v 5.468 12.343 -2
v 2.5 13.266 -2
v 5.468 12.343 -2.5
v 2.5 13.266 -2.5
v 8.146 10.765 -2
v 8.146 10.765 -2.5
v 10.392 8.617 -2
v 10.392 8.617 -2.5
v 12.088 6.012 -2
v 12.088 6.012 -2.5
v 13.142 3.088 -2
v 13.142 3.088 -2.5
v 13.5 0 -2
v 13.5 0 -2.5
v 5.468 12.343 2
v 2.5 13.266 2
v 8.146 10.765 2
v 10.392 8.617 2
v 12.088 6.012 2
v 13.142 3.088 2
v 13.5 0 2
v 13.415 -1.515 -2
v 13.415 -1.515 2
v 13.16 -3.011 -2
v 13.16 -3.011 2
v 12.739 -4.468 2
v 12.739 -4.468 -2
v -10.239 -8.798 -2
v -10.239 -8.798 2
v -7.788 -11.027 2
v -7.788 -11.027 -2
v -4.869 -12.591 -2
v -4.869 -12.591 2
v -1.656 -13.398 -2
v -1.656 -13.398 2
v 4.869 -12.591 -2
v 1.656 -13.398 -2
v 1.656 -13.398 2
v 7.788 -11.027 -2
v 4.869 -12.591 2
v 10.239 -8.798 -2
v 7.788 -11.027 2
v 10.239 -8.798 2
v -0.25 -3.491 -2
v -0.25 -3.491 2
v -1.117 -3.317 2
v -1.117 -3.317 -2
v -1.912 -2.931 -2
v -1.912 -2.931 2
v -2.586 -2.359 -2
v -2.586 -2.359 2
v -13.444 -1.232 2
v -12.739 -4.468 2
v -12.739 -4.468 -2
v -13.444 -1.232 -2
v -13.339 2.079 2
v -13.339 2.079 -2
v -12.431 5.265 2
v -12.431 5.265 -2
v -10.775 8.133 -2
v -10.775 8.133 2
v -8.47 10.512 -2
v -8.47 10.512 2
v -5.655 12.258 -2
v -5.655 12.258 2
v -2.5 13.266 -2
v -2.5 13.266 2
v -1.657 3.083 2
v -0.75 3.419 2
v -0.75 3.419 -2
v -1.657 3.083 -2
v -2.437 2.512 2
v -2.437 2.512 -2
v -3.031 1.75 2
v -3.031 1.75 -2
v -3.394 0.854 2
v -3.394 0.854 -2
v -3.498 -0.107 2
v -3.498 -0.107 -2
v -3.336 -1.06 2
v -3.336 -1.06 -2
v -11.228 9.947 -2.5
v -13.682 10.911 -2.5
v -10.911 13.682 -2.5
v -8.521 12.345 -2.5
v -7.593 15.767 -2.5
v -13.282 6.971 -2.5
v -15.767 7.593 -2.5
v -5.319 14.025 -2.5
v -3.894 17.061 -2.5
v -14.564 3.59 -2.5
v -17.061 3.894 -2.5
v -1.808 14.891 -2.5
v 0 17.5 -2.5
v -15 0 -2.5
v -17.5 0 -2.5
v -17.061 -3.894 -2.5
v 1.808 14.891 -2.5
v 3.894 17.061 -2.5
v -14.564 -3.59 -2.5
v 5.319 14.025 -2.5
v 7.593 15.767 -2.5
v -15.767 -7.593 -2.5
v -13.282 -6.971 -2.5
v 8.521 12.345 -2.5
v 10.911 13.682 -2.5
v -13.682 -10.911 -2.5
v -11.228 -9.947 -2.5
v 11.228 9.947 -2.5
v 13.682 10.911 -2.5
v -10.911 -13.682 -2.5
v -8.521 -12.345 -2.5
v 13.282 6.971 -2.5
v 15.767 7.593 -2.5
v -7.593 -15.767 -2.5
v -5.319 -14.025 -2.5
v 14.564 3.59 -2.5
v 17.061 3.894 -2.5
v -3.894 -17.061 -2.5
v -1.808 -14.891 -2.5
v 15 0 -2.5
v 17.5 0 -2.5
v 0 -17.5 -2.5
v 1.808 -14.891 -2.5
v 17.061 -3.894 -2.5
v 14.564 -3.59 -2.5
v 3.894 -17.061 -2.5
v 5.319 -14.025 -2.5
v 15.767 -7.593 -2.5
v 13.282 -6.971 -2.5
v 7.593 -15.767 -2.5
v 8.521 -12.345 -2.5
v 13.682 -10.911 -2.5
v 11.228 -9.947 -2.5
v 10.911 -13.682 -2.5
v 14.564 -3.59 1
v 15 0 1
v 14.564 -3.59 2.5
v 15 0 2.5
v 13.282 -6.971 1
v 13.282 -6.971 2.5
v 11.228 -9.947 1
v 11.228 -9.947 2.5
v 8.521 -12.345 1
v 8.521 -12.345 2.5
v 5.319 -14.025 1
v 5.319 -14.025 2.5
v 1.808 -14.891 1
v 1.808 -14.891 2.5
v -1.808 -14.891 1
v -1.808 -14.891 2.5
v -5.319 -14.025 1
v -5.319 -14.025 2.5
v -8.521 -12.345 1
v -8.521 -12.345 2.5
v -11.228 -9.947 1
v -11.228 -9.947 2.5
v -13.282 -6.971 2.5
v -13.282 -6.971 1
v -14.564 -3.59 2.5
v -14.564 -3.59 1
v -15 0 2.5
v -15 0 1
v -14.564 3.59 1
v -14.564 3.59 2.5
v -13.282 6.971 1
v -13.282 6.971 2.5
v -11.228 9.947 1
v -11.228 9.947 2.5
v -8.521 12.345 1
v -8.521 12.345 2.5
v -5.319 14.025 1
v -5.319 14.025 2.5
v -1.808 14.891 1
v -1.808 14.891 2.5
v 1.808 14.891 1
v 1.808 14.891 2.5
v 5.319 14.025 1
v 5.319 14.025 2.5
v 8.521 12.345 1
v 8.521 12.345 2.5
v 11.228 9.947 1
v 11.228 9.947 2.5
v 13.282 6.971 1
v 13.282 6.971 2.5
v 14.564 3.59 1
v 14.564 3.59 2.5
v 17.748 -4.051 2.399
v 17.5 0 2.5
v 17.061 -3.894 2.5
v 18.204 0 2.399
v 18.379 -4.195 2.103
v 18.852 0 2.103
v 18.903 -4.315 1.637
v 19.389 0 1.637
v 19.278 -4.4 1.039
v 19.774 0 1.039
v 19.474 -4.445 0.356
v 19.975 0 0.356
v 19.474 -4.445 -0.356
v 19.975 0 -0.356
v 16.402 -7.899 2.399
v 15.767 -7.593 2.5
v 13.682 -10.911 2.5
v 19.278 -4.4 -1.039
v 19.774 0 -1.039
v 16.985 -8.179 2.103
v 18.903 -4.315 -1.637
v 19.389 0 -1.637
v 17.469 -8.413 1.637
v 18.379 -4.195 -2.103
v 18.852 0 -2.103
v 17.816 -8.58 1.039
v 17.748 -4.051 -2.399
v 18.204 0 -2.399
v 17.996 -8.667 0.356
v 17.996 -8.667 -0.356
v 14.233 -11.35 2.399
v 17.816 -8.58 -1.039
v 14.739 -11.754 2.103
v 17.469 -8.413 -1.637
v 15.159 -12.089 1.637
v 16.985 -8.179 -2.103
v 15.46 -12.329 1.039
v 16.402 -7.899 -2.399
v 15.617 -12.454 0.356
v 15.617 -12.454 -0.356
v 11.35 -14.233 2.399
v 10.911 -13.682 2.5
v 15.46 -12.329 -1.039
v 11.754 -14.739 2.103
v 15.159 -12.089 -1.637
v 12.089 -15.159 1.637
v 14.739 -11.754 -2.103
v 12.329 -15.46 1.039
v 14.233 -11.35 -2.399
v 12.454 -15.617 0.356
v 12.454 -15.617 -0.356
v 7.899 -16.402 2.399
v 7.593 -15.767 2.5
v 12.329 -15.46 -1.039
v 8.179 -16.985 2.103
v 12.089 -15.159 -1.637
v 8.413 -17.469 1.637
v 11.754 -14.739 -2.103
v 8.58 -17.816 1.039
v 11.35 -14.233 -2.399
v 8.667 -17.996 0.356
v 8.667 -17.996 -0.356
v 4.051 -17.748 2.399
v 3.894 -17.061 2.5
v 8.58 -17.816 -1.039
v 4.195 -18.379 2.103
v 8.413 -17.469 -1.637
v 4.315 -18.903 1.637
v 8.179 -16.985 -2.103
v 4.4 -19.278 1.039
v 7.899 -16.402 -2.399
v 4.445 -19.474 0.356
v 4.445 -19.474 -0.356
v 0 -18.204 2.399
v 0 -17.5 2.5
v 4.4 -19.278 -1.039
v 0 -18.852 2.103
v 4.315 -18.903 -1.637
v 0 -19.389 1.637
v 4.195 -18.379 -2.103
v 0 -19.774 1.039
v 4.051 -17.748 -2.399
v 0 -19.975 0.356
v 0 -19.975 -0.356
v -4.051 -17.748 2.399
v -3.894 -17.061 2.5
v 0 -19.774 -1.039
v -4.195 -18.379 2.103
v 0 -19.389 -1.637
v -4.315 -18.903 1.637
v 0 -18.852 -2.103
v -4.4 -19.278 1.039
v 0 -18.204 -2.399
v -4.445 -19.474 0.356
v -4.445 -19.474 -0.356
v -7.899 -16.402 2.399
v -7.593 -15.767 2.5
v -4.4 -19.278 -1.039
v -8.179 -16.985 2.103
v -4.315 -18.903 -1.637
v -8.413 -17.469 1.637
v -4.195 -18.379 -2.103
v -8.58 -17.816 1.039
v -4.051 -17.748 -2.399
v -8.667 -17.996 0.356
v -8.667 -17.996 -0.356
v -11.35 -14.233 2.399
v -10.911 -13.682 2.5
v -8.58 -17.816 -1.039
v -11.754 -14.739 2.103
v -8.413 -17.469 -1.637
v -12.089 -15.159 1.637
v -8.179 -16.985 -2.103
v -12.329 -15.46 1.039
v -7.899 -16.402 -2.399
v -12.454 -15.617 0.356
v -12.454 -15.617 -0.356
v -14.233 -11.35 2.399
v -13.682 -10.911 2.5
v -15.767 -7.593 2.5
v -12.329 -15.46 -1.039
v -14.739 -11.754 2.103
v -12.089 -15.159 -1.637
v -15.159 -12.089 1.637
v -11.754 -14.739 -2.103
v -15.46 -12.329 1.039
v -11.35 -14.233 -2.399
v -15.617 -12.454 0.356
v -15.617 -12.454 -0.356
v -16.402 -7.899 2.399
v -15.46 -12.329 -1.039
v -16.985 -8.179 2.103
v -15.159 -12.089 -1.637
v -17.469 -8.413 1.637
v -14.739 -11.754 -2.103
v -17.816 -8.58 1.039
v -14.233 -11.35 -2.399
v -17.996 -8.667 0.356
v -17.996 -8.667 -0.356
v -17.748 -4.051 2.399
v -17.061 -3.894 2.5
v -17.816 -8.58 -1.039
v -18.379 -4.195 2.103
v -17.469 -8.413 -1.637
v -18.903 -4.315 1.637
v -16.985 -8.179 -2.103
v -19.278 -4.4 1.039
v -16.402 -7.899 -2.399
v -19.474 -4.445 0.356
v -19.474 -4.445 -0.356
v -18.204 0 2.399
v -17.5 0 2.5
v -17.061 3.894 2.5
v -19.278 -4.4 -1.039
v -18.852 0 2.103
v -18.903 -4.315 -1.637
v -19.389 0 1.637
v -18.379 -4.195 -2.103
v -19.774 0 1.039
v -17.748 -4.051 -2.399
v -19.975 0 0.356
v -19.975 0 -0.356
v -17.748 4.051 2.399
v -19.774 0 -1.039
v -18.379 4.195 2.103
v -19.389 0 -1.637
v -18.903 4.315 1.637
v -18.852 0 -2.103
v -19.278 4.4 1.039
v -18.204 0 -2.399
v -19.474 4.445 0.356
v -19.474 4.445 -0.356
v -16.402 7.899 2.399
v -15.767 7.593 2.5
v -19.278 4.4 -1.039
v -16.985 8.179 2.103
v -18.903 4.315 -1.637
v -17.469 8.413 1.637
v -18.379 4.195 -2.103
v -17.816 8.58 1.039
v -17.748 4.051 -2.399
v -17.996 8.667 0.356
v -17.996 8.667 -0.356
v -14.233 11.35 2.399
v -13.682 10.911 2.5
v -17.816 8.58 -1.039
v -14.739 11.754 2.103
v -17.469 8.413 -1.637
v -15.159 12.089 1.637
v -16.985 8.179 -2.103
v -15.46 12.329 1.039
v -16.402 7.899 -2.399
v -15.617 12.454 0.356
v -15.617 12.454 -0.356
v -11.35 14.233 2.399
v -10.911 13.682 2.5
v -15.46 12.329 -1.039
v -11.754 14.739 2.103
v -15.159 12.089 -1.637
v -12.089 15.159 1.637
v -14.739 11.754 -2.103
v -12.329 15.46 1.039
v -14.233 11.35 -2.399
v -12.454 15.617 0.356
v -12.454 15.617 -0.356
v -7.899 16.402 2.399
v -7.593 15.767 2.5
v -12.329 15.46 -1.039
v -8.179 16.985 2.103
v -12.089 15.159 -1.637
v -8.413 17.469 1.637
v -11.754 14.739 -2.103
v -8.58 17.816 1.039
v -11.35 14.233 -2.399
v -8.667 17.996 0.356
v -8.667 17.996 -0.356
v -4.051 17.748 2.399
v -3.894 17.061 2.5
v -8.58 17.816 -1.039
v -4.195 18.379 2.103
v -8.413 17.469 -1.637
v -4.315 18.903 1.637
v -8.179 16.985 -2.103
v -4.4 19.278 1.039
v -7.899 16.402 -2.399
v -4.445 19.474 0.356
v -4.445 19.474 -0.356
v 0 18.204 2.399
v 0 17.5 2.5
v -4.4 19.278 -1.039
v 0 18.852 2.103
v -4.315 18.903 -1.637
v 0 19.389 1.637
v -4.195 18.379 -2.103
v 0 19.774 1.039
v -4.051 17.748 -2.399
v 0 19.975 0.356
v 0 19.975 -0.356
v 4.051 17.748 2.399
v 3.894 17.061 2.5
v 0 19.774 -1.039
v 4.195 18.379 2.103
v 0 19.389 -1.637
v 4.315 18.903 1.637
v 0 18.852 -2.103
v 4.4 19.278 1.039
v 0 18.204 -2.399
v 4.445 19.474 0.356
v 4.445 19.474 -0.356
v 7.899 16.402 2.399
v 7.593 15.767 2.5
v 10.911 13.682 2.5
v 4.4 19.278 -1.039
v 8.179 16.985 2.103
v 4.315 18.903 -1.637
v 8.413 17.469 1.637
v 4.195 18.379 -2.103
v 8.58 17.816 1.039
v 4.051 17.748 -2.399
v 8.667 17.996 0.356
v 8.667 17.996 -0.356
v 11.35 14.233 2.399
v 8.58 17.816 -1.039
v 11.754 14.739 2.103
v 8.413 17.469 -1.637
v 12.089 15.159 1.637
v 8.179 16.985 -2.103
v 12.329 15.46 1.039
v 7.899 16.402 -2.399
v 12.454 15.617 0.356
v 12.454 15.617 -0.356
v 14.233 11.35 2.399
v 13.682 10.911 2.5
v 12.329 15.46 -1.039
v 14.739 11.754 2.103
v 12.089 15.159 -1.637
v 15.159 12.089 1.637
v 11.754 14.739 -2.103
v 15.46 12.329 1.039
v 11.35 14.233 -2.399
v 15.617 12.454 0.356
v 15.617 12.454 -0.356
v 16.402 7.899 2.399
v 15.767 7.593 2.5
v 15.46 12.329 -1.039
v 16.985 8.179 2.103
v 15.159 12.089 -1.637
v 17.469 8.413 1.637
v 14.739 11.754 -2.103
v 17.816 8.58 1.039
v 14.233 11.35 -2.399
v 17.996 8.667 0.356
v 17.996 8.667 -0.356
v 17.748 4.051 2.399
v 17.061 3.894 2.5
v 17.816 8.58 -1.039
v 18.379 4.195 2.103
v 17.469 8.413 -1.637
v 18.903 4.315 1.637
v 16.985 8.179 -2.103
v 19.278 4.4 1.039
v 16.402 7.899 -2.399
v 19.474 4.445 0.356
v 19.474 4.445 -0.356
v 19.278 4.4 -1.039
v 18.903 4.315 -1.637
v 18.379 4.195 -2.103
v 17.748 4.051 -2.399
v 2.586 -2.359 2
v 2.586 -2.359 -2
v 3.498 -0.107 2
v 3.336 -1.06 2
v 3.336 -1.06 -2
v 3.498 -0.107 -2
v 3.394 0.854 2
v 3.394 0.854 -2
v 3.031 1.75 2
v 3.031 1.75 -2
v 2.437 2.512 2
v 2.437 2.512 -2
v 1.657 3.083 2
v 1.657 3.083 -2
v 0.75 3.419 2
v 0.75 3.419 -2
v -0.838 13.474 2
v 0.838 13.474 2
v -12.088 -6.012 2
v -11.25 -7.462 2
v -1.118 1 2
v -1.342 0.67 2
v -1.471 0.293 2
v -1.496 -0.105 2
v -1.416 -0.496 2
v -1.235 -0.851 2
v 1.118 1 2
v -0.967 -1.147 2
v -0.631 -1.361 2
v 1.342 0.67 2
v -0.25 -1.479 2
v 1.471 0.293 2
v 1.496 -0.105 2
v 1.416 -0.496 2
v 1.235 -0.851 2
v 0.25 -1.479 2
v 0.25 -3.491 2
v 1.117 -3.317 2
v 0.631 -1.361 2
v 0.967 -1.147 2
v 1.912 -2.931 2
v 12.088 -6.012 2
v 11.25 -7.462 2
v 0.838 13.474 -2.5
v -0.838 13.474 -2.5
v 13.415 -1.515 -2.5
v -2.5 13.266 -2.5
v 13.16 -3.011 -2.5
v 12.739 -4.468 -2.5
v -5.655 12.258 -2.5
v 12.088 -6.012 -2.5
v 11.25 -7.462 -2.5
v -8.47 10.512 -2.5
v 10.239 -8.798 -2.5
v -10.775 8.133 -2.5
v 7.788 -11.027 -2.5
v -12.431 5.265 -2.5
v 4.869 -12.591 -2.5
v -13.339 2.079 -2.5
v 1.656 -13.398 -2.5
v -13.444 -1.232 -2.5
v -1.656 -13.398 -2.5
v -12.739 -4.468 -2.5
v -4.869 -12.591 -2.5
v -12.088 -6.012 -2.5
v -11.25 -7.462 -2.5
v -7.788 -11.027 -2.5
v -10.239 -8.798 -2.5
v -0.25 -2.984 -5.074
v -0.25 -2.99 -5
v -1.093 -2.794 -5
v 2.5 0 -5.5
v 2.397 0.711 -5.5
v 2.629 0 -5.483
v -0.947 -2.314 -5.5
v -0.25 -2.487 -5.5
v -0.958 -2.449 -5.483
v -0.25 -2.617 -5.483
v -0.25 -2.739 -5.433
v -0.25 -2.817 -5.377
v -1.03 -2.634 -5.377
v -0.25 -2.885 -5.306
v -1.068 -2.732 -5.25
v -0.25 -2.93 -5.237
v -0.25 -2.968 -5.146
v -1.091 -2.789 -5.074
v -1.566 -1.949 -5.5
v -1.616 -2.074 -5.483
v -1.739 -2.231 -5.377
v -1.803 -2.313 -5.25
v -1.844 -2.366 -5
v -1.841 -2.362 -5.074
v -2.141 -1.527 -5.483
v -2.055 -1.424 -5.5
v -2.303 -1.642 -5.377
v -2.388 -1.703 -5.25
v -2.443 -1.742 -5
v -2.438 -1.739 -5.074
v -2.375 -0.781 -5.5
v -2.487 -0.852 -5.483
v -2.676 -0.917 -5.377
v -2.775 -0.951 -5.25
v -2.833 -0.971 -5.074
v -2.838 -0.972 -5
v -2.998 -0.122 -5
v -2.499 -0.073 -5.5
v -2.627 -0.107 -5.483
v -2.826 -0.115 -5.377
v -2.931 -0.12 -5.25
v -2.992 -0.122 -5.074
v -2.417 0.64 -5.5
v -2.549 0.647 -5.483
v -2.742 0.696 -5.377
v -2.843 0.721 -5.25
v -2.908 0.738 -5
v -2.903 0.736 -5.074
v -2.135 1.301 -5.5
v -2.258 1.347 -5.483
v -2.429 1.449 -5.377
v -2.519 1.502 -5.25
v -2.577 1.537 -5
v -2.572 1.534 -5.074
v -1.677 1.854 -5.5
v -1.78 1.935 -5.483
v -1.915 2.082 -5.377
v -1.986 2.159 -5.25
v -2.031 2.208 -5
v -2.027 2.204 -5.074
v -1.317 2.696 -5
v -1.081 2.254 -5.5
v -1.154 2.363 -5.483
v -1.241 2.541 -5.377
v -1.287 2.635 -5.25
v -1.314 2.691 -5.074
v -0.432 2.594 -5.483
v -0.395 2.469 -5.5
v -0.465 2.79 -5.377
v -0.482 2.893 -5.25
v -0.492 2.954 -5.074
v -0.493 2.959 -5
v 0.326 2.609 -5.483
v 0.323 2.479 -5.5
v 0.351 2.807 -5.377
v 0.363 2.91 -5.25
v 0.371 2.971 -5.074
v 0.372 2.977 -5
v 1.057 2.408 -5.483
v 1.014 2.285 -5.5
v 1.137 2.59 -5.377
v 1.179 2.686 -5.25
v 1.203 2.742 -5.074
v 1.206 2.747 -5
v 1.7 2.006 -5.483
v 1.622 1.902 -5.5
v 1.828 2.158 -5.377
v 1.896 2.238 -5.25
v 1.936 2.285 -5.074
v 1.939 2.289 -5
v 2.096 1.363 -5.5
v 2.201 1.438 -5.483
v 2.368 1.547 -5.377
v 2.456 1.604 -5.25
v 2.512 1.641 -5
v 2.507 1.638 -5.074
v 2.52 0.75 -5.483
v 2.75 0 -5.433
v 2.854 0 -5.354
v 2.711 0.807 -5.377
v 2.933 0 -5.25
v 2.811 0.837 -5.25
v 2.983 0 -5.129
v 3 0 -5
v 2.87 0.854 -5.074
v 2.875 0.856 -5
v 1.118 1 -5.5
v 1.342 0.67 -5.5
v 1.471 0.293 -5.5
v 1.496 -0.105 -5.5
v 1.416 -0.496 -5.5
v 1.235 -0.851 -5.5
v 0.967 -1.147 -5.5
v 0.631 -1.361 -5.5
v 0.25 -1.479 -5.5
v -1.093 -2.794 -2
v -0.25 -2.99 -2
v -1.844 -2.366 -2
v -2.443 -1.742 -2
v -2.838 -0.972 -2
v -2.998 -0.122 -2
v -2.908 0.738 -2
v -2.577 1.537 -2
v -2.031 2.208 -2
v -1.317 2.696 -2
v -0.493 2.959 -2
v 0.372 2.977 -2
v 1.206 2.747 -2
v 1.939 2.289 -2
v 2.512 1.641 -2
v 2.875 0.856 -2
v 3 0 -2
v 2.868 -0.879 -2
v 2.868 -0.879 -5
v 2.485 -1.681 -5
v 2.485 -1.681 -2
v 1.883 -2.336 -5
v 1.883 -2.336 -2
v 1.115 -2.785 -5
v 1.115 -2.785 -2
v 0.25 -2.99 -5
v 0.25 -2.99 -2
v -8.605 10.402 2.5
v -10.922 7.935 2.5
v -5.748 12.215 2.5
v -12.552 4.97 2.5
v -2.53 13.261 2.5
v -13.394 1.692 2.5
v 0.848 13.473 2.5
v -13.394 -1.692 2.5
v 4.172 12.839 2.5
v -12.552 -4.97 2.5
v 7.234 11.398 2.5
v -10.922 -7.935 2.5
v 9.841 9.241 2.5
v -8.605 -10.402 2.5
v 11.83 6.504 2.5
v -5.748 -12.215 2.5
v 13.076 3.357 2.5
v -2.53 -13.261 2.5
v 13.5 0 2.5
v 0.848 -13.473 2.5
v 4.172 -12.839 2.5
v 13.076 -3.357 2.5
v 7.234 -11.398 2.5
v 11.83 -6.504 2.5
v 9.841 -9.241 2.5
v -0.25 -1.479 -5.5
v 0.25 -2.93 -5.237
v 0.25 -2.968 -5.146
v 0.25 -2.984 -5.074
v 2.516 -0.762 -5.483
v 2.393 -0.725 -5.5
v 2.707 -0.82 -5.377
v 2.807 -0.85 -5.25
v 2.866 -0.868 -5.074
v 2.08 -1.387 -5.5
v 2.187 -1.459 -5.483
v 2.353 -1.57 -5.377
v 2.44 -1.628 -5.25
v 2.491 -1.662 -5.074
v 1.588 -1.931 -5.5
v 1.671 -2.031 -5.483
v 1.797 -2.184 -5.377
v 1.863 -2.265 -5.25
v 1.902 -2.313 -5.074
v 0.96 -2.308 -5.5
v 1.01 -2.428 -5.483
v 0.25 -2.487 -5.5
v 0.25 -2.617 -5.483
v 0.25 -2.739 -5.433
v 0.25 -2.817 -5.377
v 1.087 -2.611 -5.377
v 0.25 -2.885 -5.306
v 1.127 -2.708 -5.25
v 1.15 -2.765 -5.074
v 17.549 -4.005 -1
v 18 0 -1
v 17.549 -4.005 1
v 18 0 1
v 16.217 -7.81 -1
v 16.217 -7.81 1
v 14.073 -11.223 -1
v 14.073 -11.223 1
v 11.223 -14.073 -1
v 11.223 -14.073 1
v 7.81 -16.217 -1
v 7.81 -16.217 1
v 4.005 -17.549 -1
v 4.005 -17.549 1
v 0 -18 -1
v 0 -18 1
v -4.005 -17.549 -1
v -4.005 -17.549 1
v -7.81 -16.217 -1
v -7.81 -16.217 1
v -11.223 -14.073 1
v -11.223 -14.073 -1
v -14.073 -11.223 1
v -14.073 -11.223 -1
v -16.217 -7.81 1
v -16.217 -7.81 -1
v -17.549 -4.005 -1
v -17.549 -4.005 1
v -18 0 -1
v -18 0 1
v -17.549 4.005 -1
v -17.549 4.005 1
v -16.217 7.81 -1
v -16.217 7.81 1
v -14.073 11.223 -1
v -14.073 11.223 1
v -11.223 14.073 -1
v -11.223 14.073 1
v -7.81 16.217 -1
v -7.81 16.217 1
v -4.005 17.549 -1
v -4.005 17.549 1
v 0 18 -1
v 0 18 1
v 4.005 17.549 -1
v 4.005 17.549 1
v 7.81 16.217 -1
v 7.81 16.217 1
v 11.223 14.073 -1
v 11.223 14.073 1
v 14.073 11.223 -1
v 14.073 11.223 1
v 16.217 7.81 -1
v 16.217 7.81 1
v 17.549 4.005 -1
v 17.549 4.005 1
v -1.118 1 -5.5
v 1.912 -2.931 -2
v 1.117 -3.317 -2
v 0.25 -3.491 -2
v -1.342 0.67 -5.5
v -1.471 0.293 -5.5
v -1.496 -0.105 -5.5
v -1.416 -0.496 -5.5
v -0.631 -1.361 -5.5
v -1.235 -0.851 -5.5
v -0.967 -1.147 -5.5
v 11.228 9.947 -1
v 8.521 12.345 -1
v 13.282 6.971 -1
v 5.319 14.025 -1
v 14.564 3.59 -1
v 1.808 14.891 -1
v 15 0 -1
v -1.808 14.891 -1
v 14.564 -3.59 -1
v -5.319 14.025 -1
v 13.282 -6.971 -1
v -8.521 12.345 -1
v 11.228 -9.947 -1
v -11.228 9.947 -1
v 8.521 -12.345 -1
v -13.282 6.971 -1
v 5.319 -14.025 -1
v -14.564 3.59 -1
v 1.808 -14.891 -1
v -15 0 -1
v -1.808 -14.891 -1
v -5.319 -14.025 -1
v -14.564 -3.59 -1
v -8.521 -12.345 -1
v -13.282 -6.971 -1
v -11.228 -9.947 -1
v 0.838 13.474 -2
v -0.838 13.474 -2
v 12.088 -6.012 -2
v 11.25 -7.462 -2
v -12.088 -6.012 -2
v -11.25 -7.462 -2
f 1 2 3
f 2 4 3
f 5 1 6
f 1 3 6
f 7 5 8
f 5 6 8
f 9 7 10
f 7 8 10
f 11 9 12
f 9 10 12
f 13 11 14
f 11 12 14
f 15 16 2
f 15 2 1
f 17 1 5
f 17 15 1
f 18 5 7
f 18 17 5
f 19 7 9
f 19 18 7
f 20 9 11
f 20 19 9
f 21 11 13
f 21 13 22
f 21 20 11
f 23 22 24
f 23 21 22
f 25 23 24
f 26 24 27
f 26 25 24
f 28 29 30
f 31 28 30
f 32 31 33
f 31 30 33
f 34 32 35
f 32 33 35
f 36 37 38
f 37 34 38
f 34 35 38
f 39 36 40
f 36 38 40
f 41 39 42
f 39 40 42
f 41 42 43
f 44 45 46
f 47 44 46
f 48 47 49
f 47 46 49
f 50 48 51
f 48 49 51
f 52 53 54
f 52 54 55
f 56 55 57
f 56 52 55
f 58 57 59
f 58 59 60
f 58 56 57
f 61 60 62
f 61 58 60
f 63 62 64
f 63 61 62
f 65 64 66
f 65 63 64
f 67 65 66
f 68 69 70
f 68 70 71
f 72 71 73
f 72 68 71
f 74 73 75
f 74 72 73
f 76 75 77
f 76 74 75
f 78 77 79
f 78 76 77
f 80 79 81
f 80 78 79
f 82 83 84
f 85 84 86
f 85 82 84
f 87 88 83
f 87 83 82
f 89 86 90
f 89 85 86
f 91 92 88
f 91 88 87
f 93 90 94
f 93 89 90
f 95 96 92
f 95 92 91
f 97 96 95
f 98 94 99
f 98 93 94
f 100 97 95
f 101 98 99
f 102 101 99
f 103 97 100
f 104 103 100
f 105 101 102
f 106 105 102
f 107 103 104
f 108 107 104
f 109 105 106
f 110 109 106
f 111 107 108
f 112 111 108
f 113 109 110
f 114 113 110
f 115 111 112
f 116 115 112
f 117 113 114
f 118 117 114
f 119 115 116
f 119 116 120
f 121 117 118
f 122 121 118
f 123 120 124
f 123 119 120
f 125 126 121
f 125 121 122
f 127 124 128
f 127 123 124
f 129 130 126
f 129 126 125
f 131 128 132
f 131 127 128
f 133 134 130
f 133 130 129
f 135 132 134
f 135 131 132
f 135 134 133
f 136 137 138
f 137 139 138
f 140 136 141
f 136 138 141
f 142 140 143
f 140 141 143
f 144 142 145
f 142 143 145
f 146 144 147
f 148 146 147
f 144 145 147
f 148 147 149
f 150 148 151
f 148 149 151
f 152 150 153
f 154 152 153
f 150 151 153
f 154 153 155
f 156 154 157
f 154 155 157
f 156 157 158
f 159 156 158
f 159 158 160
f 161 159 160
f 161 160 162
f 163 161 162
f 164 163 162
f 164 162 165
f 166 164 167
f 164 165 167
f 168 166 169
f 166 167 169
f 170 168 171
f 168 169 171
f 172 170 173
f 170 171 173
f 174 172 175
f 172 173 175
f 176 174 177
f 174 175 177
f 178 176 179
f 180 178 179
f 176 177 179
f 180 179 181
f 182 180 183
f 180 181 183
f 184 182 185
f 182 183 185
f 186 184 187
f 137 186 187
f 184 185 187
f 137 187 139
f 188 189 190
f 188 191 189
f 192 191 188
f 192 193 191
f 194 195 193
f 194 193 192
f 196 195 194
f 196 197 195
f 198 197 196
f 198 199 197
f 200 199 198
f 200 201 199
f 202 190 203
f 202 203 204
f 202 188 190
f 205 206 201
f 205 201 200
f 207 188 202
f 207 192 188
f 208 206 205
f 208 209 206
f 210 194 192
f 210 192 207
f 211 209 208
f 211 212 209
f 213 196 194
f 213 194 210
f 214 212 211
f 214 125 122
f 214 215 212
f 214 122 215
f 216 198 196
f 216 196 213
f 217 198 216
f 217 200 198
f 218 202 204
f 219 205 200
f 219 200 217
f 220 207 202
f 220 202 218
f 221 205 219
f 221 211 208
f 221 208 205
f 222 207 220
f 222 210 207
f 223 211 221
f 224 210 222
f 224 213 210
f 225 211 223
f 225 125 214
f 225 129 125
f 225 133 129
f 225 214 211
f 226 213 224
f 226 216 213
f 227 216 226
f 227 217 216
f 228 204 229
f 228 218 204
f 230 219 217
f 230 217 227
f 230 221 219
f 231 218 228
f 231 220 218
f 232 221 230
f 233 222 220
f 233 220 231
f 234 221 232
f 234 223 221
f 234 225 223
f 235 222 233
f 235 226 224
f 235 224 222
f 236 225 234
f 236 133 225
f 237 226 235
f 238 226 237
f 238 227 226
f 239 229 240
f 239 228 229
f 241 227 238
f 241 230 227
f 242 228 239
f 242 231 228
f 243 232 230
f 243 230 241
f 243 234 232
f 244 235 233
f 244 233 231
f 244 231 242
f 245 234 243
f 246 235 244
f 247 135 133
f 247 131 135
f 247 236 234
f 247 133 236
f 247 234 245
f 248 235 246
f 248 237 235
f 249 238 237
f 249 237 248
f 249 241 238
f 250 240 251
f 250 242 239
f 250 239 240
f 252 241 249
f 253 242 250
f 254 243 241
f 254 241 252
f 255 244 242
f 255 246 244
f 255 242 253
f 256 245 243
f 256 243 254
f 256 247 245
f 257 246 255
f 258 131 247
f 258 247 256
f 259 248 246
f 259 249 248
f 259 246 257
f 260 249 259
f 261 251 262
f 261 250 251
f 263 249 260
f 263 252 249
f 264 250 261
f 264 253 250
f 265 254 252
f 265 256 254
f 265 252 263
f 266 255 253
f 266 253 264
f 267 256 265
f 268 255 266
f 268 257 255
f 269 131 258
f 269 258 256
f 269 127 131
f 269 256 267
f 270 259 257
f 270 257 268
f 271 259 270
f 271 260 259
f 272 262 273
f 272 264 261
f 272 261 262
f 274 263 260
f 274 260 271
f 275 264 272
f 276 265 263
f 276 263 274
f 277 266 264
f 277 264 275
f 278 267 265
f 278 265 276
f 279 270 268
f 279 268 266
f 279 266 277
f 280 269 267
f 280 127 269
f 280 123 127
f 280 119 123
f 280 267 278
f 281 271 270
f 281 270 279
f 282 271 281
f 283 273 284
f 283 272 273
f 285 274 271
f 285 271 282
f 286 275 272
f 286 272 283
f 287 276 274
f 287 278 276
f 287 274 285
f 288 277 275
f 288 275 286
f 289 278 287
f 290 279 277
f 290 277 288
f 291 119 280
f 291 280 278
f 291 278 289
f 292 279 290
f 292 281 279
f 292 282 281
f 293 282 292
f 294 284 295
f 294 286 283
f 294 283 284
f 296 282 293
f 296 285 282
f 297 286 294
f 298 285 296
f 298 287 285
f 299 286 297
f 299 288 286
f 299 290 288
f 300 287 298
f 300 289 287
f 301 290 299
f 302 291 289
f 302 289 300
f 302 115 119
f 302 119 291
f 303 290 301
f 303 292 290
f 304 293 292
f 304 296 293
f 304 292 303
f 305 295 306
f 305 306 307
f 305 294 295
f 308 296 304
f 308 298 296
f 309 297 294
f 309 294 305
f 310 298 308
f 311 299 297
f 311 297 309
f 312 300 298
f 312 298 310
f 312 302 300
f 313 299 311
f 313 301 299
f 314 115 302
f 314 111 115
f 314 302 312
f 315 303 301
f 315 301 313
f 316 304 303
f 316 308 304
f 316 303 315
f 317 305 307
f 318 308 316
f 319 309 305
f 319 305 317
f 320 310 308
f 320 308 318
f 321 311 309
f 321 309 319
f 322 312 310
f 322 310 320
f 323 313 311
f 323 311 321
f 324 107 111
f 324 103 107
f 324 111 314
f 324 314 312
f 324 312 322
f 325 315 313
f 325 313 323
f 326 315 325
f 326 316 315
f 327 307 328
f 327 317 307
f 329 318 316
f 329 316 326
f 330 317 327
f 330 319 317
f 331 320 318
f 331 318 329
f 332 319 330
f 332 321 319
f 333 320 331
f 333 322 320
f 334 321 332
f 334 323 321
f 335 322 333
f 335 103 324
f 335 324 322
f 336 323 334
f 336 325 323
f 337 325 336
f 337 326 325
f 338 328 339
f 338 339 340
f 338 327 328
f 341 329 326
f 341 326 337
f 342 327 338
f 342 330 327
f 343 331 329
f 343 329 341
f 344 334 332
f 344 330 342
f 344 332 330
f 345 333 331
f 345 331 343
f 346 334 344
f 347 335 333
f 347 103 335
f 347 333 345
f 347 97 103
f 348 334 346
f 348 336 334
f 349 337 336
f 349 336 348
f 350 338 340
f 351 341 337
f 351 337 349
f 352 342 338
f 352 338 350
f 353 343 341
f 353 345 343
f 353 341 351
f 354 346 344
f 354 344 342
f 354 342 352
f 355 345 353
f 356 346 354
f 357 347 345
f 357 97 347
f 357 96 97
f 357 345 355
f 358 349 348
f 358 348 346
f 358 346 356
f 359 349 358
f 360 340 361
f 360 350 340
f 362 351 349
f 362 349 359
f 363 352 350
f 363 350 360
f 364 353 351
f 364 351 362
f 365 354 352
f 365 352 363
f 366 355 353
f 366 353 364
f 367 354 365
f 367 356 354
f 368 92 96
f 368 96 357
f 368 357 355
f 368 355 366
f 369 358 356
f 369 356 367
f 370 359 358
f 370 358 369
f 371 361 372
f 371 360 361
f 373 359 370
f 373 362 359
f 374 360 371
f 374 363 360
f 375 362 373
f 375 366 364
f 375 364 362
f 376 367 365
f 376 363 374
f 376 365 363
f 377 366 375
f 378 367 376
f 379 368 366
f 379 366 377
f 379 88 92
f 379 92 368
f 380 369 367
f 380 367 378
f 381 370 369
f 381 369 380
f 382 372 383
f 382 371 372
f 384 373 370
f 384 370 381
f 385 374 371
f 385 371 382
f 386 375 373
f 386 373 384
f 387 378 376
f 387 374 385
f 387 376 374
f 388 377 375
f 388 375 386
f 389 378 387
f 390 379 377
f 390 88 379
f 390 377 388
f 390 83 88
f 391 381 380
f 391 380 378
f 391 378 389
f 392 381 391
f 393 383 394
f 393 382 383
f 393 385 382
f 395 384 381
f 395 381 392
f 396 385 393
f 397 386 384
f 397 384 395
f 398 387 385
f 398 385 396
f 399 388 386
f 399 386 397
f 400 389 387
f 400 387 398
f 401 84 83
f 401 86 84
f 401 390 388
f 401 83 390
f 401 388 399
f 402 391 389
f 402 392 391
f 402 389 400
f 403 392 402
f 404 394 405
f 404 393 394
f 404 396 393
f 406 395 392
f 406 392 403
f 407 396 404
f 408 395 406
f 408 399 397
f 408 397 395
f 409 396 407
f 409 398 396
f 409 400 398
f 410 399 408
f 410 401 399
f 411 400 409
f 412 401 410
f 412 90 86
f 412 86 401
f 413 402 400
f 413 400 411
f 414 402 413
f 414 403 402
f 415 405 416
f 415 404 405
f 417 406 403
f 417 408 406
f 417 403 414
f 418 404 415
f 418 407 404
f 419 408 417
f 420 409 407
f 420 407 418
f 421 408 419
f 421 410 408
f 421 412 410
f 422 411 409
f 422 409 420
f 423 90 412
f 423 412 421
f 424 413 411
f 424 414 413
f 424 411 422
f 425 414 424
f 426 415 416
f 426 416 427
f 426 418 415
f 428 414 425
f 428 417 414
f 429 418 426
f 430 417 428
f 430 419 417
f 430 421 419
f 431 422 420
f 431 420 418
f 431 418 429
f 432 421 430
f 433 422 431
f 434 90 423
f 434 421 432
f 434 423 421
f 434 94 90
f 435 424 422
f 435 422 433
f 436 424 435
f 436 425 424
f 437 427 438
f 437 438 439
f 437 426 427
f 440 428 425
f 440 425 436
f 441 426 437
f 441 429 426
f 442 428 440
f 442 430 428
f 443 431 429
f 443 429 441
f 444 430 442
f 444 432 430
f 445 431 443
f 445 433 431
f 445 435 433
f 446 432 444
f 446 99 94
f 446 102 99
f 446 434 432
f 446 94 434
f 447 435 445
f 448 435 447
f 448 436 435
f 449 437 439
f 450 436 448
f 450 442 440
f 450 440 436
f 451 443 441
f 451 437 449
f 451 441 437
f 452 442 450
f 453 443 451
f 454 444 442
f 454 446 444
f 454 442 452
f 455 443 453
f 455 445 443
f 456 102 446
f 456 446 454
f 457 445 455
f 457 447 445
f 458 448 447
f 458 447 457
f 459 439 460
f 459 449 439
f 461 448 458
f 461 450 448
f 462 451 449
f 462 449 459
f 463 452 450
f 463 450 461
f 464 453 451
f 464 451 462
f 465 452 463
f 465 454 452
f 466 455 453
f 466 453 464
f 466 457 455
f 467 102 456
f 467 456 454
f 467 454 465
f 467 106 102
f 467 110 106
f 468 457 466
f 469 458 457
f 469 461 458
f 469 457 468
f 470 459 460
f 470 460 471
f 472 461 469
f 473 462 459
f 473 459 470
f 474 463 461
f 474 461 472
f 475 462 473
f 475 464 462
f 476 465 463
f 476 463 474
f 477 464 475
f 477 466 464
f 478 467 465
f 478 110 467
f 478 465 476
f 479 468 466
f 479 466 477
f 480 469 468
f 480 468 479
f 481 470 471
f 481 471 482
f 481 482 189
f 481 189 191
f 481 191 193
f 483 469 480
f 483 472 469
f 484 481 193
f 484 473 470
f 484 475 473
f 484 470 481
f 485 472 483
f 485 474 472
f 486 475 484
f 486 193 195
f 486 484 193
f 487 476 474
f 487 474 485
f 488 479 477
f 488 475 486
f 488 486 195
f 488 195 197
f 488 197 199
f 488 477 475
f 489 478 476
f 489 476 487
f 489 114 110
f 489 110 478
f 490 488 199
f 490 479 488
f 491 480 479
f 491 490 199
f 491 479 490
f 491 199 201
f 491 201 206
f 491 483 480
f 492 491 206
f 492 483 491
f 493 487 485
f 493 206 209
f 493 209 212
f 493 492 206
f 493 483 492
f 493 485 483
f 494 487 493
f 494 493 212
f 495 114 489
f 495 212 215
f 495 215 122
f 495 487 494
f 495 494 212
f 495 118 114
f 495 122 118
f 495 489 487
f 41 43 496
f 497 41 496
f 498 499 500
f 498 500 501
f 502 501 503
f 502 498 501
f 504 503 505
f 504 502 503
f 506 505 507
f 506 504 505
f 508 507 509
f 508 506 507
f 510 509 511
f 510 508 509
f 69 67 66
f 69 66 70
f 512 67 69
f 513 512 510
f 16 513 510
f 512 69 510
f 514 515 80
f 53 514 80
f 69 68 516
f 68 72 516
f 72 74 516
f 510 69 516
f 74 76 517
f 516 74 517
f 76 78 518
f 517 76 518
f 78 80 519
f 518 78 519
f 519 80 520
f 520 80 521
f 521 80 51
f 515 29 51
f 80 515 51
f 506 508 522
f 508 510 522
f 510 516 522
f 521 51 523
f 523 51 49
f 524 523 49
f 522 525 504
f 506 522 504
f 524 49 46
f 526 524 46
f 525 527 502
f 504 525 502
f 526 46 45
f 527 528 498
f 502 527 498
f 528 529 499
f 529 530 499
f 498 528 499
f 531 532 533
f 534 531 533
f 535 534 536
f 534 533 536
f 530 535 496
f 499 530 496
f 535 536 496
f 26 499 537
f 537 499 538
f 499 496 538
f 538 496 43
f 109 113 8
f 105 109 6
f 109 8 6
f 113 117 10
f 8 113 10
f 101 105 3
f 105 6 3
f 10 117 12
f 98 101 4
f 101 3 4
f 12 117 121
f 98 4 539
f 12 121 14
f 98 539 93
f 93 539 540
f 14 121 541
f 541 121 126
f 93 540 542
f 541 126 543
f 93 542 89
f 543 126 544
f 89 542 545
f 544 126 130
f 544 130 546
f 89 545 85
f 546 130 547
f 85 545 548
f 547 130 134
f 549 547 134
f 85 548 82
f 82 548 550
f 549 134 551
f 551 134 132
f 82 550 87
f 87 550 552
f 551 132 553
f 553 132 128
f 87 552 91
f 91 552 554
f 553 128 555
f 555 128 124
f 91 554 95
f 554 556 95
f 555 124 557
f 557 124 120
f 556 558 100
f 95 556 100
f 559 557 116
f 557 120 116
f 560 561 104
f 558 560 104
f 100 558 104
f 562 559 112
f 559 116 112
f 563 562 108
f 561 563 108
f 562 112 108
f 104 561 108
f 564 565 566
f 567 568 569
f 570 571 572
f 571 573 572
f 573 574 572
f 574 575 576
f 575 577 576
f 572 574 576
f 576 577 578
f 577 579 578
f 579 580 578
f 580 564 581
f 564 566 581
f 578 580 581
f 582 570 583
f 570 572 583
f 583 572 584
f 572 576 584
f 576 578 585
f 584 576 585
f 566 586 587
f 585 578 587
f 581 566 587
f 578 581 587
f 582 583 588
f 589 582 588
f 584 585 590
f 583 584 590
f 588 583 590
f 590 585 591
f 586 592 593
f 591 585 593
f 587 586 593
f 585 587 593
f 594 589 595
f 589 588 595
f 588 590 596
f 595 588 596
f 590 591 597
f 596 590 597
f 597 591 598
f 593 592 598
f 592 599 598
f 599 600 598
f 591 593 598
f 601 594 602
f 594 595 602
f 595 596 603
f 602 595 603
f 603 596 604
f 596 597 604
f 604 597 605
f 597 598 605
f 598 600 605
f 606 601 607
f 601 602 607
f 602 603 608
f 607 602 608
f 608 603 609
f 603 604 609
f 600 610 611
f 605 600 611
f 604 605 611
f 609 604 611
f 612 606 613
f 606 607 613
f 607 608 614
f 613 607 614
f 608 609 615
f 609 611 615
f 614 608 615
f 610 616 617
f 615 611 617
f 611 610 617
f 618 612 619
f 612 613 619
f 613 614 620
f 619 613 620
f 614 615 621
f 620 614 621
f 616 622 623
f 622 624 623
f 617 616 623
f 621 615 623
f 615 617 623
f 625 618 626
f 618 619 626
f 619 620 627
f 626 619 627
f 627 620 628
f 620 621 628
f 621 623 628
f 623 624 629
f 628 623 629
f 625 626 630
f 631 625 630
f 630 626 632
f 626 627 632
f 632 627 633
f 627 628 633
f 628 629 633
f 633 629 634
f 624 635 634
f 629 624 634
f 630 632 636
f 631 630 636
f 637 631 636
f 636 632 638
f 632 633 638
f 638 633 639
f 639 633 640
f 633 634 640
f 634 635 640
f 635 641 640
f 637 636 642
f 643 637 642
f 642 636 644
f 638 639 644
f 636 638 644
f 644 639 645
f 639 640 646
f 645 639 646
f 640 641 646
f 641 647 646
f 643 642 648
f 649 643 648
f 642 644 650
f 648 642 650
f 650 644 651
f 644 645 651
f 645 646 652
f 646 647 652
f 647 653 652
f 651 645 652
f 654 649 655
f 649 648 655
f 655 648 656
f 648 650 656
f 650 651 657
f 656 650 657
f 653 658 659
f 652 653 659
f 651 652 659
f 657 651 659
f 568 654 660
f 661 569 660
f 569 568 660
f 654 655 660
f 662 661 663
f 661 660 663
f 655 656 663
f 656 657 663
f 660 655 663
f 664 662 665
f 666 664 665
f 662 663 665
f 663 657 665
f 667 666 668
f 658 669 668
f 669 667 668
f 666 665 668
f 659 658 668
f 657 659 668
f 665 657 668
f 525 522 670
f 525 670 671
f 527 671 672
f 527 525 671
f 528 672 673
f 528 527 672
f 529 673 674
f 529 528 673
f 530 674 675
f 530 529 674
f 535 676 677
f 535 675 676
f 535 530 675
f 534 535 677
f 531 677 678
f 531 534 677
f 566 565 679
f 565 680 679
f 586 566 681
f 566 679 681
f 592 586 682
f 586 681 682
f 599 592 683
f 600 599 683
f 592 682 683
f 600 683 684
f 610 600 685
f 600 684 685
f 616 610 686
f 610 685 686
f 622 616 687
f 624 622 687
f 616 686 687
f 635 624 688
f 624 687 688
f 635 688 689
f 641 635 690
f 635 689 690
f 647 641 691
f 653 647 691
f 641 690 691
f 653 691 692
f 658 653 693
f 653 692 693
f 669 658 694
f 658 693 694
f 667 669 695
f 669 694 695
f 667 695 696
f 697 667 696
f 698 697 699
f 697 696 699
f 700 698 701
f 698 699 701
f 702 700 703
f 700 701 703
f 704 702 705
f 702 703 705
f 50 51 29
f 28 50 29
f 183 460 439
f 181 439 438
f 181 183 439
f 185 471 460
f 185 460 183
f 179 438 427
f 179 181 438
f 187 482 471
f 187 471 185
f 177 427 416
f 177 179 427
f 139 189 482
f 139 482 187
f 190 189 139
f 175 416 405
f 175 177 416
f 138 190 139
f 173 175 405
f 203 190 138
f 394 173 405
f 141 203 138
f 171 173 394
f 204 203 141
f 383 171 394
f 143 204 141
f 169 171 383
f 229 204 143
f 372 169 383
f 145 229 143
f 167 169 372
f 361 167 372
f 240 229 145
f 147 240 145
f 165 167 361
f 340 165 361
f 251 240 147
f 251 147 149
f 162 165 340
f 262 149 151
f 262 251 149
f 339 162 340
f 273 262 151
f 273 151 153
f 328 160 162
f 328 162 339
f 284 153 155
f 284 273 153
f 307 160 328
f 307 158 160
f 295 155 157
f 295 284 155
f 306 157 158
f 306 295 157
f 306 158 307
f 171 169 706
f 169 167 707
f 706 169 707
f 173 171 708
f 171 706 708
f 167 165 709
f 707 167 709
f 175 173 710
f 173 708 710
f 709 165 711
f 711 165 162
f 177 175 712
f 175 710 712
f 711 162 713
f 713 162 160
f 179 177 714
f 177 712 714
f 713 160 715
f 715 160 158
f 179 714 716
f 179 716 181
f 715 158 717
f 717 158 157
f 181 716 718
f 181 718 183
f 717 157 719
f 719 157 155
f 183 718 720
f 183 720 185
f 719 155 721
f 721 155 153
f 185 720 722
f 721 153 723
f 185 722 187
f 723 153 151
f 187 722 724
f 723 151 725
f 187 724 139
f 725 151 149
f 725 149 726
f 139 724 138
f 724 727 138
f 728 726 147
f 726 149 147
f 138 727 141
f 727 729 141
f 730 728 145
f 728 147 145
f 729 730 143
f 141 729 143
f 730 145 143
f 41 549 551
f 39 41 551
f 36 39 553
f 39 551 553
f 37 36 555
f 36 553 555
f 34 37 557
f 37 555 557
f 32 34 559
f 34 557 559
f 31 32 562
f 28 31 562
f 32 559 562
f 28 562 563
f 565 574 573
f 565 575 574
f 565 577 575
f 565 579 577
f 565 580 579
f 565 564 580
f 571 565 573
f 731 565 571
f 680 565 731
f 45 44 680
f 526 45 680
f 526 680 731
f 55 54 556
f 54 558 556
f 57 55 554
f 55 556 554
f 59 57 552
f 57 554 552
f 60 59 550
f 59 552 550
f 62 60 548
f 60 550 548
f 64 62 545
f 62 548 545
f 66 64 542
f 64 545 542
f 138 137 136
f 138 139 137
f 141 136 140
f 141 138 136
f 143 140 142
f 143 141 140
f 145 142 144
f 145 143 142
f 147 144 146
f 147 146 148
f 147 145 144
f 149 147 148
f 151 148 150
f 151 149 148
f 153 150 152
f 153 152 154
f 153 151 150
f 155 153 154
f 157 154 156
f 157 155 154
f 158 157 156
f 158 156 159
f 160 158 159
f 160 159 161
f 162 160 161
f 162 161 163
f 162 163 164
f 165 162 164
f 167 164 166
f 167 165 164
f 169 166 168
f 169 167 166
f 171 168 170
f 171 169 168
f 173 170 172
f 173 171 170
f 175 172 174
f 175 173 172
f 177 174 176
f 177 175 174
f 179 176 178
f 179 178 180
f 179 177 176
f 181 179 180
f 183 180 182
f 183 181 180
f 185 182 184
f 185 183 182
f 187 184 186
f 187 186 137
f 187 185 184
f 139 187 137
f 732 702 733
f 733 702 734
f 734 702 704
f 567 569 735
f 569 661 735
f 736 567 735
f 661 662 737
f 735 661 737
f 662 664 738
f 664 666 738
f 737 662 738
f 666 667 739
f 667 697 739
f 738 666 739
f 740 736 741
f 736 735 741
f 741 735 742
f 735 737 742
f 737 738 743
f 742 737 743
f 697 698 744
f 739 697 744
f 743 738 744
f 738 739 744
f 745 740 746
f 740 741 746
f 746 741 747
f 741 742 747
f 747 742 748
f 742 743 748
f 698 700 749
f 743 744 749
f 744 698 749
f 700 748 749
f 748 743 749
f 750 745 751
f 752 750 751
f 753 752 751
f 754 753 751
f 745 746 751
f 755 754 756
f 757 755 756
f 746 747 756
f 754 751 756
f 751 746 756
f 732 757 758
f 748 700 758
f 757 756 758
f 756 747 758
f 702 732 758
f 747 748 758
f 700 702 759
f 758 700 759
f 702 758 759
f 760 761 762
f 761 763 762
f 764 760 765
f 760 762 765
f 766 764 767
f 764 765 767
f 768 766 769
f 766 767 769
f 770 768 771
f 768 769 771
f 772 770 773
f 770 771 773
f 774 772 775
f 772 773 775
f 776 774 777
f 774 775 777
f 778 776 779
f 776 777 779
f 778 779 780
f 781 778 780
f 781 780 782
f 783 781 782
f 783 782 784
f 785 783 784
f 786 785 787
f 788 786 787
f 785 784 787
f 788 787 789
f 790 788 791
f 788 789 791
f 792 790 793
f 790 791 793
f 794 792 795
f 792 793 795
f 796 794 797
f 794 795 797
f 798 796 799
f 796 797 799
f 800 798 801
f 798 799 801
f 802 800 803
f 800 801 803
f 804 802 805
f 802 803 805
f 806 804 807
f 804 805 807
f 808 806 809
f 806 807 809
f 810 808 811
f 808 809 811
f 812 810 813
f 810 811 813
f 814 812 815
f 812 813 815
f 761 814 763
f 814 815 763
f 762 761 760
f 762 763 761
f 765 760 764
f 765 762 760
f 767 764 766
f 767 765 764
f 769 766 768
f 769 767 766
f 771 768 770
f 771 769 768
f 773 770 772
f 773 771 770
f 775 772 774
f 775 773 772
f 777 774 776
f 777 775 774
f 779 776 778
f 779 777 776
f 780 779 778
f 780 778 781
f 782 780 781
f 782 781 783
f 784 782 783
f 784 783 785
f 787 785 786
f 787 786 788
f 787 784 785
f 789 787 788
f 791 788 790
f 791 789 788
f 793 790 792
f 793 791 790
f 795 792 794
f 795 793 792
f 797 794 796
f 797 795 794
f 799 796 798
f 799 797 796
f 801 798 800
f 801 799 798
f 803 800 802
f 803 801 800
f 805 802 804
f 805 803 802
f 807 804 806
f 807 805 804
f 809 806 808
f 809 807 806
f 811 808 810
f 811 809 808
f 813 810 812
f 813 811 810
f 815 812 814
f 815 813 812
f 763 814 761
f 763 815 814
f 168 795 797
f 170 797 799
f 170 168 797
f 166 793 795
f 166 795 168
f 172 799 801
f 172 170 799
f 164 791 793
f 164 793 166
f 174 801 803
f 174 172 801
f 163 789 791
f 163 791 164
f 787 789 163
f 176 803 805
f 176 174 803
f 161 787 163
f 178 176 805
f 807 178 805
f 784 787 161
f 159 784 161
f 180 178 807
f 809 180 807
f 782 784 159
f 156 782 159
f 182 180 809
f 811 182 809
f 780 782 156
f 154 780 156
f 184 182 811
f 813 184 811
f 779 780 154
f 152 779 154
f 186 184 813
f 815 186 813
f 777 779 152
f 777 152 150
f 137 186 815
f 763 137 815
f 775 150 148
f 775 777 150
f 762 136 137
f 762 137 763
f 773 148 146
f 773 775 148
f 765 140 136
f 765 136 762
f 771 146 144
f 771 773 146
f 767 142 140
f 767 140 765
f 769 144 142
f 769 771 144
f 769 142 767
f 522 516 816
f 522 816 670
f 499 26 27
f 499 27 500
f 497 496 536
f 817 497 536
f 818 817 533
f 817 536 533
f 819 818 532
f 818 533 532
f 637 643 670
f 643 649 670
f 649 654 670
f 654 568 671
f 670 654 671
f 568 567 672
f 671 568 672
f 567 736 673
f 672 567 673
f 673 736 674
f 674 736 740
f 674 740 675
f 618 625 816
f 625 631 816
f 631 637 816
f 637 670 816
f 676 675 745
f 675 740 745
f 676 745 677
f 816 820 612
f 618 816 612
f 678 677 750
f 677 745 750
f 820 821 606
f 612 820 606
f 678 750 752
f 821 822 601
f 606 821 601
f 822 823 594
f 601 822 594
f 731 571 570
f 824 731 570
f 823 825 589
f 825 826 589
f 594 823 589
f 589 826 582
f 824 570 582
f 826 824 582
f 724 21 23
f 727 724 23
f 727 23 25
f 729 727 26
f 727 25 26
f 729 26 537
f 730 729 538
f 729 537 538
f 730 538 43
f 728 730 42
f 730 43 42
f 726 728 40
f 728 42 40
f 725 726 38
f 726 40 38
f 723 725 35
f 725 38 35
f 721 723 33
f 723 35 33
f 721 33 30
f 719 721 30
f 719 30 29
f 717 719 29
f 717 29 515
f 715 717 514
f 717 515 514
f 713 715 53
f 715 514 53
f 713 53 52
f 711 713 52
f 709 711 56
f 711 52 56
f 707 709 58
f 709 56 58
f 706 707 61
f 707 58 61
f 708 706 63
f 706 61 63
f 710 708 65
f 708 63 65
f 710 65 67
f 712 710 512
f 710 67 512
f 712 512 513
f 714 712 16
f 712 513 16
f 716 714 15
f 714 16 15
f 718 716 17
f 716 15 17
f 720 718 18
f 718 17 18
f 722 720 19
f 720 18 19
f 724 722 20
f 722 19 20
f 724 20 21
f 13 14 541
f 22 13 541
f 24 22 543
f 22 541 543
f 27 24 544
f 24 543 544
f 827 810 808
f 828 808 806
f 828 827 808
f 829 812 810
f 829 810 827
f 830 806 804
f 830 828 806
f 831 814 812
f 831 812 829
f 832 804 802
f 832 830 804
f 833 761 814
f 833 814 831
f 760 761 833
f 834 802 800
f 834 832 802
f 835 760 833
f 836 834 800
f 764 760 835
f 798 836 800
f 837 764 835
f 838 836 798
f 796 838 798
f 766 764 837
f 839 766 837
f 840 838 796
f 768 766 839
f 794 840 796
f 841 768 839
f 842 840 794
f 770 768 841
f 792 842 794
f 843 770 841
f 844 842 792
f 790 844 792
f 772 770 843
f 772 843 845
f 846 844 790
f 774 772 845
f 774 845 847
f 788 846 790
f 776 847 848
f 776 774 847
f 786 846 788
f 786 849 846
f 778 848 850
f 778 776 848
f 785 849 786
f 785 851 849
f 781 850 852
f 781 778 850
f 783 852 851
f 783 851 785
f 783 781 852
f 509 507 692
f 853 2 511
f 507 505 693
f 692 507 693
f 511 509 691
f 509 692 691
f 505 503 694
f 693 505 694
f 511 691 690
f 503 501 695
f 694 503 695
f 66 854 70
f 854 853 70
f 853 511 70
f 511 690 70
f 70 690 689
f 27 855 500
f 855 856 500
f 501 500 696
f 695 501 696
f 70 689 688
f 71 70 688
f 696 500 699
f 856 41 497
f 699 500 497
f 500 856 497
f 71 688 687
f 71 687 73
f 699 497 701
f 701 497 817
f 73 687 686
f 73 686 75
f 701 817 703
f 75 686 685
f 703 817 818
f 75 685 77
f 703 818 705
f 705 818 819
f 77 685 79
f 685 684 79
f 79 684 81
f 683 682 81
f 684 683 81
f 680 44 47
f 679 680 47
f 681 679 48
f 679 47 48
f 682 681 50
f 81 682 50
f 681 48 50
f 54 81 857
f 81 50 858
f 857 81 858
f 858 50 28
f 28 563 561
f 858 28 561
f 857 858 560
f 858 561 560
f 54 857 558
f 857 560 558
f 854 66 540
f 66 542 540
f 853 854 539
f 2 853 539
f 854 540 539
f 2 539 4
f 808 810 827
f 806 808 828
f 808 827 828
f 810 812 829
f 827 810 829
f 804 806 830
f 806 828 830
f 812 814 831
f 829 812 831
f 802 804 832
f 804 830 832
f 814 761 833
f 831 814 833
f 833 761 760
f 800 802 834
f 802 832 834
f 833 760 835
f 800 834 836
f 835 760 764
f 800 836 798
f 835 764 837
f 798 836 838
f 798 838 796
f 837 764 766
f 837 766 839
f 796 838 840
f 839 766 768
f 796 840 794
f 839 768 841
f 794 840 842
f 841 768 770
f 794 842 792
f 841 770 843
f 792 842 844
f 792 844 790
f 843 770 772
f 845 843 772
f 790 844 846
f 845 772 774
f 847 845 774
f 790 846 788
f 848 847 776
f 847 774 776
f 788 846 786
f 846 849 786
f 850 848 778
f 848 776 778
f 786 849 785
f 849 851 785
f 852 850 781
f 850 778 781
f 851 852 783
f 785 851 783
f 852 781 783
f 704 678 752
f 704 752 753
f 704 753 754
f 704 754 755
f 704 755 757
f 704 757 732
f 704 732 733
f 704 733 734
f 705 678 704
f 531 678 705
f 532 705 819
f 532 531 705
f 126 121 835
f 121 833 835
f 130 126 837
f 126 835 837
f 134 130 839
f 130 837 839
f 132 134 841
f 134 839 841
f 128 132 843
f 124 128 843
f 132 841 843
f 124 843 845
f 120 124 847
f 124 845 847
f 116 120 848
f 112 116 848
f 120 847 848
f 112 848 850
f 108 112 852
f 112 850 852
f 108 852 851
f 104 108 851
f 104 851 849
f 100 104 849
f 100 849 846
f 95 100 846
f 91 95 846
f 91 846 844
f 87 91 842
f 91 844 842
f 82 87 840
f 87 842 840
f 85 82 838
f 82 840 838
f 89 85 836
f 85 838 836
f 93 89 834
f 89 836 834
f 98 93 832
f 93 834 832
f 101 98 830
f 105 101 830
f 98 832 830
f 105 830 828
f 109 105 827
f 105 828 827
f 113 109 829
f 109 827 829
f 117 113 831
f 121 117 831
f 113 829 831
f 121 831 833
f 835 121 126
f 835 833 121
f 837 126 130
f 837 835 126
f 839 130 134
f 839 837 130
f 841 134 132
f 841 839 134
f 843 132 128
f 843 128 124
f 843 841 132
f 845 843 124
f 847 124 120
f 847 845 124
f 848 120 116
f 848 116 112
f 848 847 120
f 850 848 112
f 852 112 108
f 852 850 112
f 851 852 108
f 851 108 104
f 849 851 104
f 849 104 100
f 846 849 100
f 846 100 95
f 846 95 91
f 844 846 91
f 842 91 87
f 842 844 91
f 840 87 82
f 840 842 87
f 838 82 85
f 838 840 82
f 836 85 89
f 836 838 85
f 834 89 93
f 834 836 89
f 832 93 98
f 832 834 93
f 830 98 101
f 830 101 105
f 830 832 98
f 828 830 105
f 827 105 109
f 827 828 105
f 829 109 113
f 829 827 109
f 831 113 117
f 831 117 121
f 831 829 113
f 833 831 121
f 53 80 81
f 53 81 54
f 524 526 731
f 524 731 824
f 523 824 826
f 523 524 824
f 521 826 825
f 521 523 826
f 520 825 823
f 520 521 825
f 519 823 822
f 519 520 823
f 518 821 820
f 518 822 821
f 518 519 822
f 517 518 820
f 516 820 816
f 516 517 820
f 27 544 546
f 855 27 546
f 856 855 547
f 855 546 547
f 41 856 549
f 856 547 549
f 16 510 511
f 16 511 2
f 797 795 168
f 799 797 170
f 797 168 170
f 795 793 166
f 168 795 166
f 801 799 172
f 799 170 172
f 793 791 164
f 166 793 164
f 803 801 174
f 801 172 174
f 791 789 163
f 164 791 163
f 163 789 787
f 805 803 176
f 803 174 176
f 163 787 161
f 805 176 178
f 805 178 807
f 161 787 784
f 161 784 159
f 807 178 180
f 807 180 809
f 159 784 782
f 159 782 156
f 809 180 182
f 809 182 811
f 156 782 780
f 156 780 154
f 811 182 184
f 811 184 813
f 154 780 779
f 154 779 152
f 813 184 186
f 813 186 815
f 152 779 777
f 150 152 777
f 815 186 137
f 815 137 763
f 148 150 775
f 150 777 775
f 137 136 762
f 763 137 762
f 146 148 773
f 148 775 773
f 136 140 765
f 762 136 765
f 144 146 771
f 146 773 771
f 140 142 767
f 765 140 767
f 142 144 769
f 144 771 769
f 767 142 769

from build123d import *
from build123d.topology import SkipClean

# Parameters (mm, degrees)
ODEBRAT_VYSUNUT_M1_DEPTH = 27.537709019
ODEBRAT_VYSUNUT_M2_DEPTH = 27.537709019


with BuildPart() as part:
    # Skica2 → Rotovat1 (revolve)
    with BuildSketch(Plane(origin=(0, 0, 0), x_dir=(0, 0, -1), z_dir=(1, 0, 0)), mode=Mode.PRIVATE) as rotovat1_sk:
        with BuildLine():
            Line((-2, 13.5), (-2, 0))
            Line((-2, 0), (5.5, 0))
            Line((5.5, 0), (5.5, 2.5))
            ThreePointArc((5.5, 2.5), (5.353553391, 2.853553391), (5, 3))
            Line((5, 3), (2, 3))
            Line((2, 3), (2, 13.5))
            Line((2, 13.5), (2.5, 13.5))
            Line((2.5, 13.5), (2.5, 15))
            Line((2.5, 15), (1, 15))
            Line((1, 15), (1, 18))
            Line((1, 18), (-1, 18))
            Line((-1, 18), (-1, 15))
            Line((-1, 15), (-2.5, 15))
            Line((-2.5, 15), (-2.5, 13.5))
            Line((-2.5, 13.5), (-2, 13.5))
        make_face()
    revolve(rotovat1_sk.sketch.rotate(Axis((0, 0, 36.988949001), (0, 0, -1)), 90), axis=Axis((0, 0, 36.988949001), (0, 0, -1)))

    # Skica3 → Odebrat vysunutím1 (cut, through all)
    with SkipClean():  # the faces are left unmerged after this step: merging them gives an invalid solid
        with BuildSketch(Plane.XY.offset(2)):
            with BuildLine():
                Line((12.739125293, -4.468186071), (3.335679821, -1.059830239))
                ThreePointArc((3.335679821, -1.059830239), (3.031088913, 1.75), (0.75, 3.418698583))
                Line((0.75, 3.418698583), (2.5, 13.266499161))
                ThreePointArc((2.5, 13.266499161), (11.691342951, 6.75), (12.739125293, -4.468186071))
            make_face()
            with BuildLine():
                Line((-2.5, 13.266499161), (-0.75, 3.418698583))
                ThreePointArc((-0.75, 3.418698583), (-3.031088913, 1.75), (-3.335679821, -1.059830239))
                Line((-3.335679821, -1.059830239), (-12.739125293, -4.468186071))
                ThreePointArc((-12.739125293, -4.468186071), (-11.691342951, 6.75), (-2.5, 13.266499161))
            make_face()
            with BuildLine():
                Line((10.239125293, -8.79831309), (2.585679821, -2.358868344))
                ThreePointArc((2.585679821, -2.358868344), (0, -3.5), (-2.585679821, -2.358868344))
                Line((-2.585679821, -2.358868344), (-10.239125293, -8.79831309))
                ThreePointArc((-10.239125293, -8.79831309), (0, -13.5), (10.239125293, -8.79831309))
            make_face()
        extrude(amount=-ODEBRAT_VYSUNUT_M1_DEPTH, mode=Mode.SUBTRACT)

    # Skica4 → Odebrat vysunutím2 (cut, through all)
    with SkipClean():  # the faces are left unmerged after this step: merging them gives an invalid solid
        with BuildSketch(Plane.XY.offset(2)):
            with BuildLine():
                Line((-1.118033989, 1), (1.118033989, 1))
                ThreePointArc((1.118033989, 1), (1.41572039, -0.495717438), (0.25, -1.479019946))
                Line((0.25, -1.479019946), (0.25, -4.832561127))
                Line((0.25, -4.832561127), (-0.25, -4.832561127))
                Line((-0.25, -4.832561127), (-0.25, -1.479019946))
                ThreePointArc((-0.25, -1.479019946), (-1.41572039, -0.495717438), (-1.118033989, 1))
            make_face()
        extrude(amount=-ODEBRAT_VYSUNUT_M2_DEPTH, mode=Mode.SUBTRACT)


with BuildPart() as body_2:
    # Skica5 → Rotovat2 (revolve)
    with BuildSketch(Plane(origin=(0, 0, 0), x_dir=(0, 0, -1), z_dir=(1, 0, 0)), mode=Mode.PRIVATE) as rotovat2_sk:
        with BuildLine():
            Line((-2.5, 15), (-2.5, 17.5))
            ThreePointArc((-2.5, 17.5), (0, 20), (2.5, 17.5))
            Line((2.5, 17.5), (2.5, 15))
            Line((2.5, 15), (1, 15))
            Line((1, 15), (1, 18))
            Line((1, 18), (-1, 18))
            Line((-1, 18), (-1, 15))
            Line((-1, 15), (-2.5, 15))
        make_face()
    revolve(rotovat2_sk.sketch.rotate(Axis((0, 0, 0), (0, 0, -1)), 90), axis=Axis((0, 0, 0), (0, 0, -1)))


solid = Compound([part.part, body_2.part])
